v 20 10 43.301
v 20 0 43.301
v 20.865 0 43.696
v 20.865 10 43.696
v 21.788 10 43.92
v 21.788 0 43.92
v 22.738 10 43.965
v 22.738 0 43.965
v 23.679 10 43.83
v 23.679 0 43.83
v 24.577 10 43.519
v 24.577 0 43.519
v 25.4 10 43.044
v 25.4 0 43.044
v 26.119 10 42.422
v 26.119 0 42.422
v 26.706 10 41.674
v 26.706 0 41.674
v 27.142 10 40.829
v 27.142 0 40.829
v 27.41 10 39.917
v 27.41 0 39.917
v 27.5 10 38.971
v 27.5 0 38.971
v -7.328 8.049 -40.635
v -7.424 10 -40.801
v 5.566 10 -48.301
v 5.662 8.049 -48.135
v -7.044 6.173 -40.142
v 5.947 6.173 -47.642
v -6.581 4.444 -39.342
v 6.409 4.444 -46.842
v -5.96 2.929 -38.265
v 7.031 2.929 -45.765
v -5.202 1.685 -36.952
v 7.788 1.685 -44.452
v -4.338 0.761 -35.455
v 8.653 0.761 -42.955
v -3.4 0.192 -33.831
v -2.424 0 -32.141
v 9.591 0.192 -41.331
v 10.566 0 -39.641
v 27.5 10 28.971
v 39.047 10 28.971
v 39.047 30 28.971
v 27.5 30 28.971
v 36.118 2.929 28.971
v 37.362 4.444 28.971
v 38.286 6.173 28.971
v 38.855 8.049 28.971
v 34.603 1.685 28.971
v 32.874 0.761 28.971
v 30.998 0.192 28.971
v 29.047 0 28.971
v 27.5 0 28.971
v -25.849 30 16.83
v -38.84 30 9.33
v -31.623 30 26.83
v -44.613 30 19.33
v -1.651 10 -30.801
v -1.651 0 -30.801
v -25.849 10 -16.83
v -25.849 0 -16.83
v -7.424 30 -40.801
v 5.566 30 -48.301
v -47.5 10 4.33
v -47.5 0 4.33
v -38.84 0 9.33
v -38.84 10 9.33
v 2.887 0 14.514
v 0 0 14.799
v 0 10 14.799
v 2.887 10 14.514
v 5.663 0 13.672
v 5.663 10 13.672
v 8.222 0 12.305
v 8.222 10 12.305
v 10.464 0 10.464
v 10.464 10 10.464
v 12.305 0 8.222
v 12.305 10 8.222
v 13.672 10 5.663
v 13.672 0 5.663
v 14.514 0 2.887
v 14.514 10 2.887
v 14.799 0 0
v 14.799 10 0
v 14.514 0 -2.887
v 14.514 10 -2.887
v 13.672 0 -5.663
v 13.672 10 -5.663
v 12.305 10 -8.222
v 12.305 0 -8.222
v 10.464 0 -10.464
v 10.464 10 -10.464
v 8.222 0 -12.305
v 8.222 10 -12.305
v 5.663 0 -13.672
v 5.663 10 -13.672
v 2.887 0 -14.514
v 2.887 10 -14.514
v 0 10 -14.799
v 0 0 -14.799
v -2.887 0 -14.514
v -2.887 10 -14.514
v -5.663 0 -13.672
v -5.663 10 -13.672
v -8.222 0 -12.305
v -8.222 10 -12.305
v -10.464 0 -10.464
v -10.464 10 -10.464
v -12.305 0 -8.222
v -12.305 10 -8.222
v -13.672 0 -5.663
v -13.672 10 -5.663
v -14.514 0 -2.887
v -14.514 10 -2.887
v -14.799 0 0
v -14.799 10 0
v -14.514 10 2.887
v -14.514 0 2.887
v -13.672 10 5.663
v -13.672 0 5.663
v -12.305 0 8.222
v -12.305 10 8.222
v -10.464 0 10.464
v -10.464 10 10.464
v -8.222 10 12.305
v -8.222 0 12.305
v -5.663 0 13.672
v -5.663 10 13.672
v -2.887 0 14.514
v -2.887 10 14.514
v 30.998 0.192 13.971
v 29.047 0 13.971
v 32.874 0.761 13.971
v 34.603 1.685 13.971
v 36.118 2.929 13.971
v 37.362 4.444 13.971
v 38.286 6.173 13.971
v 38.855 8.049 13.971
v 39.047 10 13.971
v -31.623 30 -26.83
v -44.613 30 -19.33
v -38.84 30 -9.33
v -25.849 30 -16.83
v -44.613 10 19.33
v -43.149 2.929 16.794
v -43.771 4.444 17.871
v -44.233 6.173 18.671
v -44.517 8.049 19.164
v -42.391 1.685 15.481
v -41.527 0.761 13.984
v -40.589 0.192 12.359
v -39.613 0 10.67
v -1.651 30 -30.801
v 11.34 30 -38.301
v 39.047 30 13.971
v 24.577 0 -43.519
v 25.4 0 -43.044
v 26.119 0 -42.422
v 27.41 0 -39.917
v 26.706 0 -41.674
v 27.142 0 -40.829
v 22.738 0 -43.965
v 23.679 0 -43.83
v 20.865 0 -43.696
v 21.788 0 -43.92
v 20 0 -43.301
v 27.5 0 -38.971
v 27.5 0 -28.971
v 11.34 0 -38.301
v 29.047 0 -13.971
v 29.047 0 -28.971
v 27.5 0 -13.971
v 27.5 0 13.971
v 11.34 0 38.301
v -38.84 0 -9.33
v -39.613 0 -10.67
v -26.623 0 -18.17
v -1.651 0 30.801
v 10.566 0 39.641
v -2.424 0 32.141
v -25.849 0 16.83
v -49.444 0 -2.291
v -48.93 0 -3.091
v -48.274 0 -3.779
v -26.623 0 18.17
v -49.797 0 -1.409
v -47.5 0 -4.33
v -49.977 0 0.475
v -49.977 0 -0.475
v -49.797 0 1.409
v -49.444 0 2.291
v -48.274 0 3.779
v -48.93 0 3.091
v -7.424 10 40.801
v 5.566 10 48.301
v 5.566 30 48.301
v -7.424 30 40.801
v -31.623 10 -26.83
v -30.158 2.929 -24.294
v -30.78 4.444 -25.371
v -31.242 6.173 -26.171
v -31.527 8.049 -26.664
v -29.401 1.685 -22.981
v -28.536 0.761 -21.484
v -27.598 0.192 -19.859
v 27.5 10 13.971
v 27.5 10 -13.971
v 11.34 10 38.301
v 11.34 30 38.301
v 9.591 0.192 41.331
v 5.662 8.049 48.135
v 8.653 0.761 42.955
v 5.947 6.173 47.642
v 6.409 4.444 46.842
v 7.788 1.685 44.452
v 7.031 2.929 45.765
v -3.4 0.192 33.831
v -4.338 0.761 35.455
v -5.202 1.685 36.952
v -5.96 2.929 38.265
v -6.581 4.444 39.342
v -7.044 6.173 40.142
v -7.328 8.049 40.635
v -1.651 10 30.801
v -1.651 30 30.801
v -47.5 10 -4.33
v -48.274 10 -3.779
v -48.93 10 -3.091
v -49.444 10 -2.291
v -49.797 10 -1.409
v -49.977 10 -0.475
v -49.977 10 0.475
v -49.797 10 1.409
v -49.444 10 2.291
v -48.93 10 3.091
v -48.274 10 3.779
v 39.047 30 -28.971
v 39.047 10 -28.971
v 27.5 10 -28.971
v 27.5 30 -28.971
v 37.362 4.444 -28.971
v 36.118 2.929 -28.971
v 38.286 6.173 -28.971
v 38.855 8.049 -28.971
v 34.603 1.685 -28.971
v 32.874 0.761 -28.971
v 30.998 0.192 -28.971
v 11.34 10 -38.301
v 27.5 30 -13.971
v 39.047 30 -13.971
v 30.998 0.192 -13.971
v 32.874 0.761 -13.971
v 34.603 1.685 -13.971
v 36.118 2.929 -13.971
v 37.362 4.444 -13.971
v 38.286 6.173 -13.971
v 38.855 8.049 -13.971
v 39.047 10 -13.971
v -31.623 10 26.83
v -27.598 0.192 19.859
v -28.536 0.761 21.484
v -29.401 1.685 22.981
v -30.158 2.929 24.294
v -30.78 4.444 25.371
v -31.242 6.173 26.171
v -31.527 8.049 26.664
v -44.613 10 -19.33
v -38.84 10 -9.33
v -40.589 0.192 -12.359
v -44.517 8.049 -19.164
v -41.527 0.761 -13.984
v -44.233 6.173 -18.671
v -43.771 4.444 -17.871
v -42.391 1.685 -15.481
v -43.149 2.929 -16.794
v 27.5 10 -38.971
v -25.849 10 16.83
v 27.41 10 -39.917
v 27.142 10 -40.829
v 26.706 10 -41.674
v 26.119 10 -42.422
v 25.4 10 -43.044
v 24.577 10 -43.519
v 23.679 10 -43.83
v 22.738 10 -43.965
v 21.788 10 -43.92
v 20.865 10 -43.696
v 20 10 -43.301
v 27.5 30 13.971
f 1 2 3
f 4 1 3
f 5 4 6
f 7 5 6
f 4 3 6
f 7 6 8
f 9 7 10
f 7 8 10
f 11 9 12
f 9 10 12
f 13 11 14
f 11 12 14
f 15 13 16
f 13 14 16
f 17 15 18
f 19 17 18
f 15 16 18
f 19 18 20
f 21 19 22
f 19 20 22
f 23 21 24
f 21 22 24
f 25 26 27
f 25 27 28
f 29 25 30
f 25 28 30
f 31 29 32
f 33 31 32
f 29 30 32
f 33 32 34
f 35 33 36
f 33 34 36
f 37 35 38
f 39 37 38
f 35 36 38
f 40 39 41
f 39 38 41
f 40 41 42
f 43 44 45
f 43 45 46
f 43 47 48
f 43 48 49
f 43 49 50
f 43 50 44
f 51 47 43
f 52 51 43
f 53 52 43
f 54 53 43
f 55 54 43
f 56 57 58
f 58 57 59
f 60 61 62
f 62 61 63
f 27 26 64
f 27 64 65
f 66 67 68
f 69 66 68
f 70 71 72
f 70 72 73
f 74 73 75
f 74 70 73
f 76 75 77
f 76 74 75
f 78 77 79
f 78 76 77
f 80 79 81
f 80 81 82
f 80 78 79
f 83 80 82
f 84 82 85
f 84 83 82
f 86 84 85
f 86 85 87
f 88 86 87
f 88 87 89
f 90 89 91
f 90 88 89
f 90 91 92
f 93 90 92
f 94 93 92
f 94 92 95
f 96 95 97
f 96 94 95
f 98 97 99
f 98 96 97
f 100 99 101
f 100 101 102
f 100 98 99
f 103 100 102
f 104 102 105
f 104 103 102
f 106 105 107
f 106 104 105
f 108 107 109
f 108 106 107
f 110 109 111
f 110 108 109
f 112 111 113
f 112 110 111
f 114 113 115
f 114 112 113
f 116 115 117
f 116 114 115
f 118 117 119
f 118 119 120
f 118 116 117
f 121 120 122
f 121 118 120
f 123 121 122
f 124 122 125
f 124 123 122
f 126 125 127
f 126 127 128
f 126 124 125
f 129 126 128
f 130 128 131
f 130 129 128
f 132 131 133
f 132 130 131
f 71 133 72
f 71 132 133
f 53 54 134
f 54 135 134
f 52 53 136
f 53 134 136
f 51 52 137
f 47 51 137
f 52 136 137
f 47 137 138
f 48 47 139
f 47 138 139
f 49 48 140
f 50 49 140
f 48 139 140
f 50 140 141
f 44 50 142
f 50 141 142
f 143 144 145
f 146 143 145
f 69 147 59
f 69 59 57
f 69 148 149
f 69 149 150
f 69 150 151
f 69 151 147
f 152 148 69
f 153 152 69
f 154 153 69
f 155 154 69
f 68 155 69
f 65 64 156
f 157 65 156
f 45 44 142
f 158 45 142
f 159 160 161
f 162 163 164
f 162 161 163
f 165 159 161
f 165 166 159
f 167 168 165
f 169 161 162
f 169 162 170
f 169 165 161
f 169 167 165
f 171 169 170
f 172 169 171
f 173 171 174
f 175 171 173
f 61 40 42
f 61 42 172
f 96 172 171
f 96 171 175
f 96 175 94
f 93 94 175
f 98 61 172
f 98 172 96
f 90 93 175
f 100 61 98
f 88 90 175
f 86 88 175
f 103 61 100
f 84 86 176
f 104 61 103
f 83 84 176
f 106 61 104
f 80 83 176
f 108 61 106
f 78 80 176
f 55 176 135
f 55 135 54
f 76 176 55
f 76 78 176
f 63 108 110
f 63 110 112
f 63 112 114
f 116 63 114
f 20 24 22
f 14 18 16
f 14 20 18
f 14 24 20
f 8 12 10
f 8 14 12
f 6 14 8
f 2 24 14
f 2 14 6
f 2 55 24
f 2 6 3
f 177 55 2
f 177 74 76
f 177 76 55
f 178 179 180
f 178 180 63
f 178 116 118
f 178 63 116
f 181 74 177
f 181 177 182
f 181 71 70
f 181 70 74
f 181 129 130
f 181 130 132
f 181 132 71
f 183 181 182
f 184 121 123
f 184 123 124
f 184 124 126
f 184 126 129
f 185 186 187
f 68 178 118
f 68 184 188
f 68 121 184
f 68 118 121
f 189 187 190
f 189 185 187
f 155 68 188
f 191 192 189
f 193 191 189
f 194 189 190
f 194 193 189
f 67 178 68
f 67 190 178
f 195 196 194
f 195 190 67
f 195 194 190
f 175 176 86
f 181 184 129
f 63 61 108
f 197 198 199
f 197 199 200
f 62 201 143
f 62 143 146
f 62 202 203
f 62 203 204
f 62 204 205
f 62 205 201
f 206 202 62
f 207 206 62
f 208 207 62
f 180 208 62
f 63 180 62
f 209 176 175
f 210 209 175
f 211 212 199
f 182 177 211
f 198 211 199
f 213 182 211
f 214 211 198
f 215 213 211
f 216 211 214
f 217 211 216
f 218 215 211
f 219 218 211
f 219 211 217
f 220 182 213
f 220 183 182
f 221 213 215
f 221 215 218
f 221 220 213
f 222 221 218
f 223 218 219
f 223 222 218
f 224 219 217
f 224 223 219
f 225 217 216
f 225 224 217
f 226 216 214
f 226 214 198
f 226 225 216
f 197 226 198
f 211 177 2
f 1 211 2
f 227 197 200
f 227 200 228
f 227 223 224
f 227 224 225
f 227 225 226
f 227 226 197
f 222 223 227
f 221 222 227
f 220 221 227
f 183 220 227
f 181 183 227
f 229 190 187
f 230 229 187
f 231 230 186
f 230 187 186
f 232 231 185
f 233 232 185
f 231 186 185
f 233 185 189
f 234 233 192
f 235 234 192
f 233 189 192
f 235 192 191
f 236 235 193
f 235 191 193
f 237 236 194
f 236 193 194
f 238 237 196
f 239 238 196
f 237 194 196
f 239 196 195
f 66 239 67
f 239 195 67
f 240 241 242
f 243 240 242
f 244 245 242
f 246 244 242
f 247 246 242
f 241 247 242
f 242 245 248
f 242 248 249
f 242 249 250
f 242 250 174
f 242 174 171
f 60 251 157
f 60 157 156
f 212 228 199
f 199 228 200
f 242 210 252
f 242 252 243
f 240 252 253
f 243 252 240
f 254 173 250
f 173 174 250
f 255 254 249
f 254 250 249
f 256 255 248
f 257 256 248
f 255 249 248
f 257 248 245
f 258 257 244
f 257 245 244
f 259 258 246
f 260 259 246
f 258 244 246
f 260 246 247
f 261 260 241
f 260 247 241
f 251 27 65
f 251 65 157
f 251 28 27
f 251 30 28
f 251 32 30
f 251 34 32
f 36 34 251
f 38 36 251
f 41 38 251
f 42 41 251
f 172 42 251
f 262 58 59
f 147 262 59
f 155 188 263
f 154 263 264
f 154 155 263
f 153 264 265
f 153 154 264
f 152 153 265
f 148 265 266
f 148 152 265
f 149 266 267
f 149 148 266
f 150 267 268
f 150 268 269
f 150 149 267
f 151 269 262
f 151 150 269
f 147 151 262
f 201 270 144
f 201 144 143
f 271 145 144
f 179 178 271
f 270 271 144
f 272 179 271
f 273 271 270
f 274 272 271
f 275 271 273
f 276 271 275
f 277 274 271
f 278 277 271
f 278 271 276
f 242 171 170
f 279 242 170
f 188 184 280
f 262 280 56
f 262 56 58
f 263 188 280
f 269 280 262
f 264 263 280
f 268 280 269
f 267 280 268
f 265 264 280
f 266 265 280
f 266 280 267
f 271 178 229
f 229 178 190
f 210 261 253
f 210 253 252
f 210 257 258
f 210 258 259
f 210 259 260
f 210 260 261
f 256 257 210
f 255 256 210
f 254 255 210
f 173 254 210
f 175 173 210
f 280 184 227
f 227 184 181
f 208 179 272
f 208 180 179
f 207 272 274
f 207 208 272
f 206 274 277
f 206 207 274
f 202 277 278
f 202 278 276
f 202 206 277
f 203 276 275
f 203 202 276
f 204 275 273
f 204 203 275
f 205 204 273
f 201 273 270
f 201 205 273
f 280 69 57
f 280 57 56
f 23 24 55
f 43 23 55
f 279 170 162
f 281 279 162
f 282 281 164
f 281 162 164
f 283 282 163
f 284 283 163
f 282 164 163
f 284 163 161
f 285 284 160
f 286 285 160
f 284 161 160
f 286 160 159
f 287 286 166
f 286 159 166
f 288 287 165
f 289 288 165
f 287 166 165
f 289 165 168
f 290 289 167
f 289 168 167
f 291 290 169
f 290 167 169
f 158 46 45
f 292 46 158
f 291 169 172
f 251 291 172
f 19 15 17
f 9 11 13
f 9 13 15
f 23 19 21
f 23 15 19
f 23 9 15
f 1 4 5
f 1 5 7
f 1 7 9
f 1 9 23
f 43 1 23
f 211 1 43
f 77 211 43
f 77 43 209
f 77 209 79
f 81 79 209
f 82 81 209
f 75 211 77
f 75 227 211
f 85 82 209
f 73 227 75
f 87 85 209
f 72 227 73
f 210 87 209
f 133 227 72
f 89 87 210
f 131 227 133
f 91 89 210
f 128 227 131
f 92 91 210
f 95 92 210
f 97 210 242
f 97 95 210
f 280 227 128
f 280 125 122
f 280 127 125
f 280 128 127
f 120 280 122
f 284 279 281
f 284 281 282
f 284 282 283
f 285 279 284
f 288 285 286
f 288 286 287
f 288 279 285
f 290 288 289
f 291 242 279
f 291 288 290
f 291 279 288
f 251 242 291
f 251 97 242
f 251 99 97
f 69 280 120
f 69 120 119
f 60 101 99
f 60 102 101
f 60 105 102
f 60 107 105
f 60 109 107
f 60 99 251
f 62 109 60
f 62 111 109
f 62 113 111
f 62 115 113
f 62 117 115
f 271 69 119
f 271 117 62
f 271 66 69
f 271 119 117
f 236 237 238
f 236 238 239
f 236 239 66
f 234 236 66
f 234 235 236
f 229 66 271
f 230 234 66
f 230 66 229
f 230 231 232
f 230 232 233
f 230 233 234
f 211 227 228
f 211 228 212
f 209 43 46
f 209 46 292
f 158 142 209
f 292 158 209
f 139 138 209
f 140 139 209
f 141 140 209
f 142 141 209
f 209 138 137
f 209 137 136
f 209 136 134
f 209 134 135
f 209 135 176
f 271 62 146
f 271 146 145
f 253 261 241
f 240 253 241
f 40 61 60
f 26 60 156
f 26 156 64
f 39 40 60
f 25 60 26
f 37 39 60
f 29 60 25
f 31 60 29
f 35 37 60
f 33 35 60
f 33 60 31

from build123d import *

# Parameters (mm, degrees)
SKETCH2_R           = 14.798837294
BOSS_EXTRUDE1_DEPTH = 10
SKETCH2_7_W         = 15
SKETCH2_7_H         = 11.547005384
BOSS_EXTRUDE3_DEPTH = 30
FILLET1_R           = 10


with BuildPart() as part:
    # Sketch2 → Boss-Extrude1 (new body)
    with BuildSketch(Plane(origin=(0, 0, 0), x_dir=(0, 0, -1), z_dir=(0, 1, 0))):
        with BuildLine():
            Line((-38.301270189, -11.339745962), (-43.301270189, -20))
            ThreePointArc((-43.301270189, -20), (-43.301270189, -25), (-38.97114317, -27.5))
            Line((-38.97114317, -27.5), (-28.97114317, -27.5))
            Line((-28.97114317, -27.5), (-13.97114317, -27.5))
            Line((-13.97114317, -27.5), (13.97114317, -27.5))
            Line((13.97114317, -27.5), (28.97114317, -27.5))
            Line((28.97114317, -27.5), (38.97114317, -27.5))
            ThreePointArc((38.97114317, -27.5), (43.301270189, -25), (43.301270189, -20))
            Line((43.301270189, -20), (38.301270189, -11.339745962))
            Line((38.301270189, -11.339745962), (30.801270189, 1.650635095))
            Line((30.801270189, 1.650635095), (16.830127019, 25.849364905))
            Line((16.830127019, 25.849364905), (9.330127019, 38.839745962))
            Line((9.330127019, 38.839745962), (4.330127019, 47.5))
            ThreePointArc((4.330127019, 47.5), (0, 50), (-4.330127019, 47.5))
            Line((-4.330127019, 47.5), (-9.330127019, 38.839745962))
            Line((-9.330127019, 38.839745962), (-16.830127019, 25.849364905))
            Line((-16.830127019, 25.849364905), (-30.801270189, 1.650635095))
            Line((-30.801270189, 1.650635095), (-38.301270189, -11.339745962))
        make_face()
        Circle(SKETCH2_R, mode=Mode.SUBTRACT)
    extrude(amount=BOSS_EXTRUDE1_DEPTH)

    # Sketch2<7> → Boss-Extrude3 (add)
    with BuildSketch(Plane(origin=(0, 0, 0), x_dir=(0, 0, -1), z_dir=(0, 1, 0))):
        Polygon((-48.301270189, -5.56624327), (-38.301270189, -11.339745962), (-30.801270189, 1.650635095), (-40.801270189, 7.424137787), align=None)
        with Locations((-21.47114317, -33.273502692)):
            Rectangle(SKETCH2_7_W, SKETCH2_7_H)
        Polygon((-26.830127019, 31.622867597), (-16.830127019, 25.849364905), (-9.330127019, 38.839745962), (-19.330127019, 44.613248654), align=None)
        with Locations((21.47114317, -33.273502692)):
            Rectangle(SKETCH2_7_W, SKETCH2_7_H)
        Polygon((19.330127019, 44.613248654), (9.330127019, 38.839745962), (16.830127019, 25.849364905), (26.830127019, 31.622867597), align=None)
        Polygon((30.801270189, 1.650635095), (38.301270189, -11.339745962), (48.301270189, -5.56624327), (40.801270189, 7.424137787), align=None)
    extrude(amount=BOSS_EXTRUDE3_DEPTH)

    # Fillet1
    fillet1_edges = [part.edges().sort_by_distance(p)[0] for p in [
        (39.047005384, 0, -21.47114317),
        (39.047005384, 0, 21.47114317),
        (-0.928947258, 0, 44.551270189),
        (-38.118058126, 0, 23.080127019),
        (-38.118058126, 0, -23.080127019),
        (-0.928947258, 0, -44.551270189),
    ]]
    fillet(fillet1_edges, radius=FILLET1_R)


solid = part.part
